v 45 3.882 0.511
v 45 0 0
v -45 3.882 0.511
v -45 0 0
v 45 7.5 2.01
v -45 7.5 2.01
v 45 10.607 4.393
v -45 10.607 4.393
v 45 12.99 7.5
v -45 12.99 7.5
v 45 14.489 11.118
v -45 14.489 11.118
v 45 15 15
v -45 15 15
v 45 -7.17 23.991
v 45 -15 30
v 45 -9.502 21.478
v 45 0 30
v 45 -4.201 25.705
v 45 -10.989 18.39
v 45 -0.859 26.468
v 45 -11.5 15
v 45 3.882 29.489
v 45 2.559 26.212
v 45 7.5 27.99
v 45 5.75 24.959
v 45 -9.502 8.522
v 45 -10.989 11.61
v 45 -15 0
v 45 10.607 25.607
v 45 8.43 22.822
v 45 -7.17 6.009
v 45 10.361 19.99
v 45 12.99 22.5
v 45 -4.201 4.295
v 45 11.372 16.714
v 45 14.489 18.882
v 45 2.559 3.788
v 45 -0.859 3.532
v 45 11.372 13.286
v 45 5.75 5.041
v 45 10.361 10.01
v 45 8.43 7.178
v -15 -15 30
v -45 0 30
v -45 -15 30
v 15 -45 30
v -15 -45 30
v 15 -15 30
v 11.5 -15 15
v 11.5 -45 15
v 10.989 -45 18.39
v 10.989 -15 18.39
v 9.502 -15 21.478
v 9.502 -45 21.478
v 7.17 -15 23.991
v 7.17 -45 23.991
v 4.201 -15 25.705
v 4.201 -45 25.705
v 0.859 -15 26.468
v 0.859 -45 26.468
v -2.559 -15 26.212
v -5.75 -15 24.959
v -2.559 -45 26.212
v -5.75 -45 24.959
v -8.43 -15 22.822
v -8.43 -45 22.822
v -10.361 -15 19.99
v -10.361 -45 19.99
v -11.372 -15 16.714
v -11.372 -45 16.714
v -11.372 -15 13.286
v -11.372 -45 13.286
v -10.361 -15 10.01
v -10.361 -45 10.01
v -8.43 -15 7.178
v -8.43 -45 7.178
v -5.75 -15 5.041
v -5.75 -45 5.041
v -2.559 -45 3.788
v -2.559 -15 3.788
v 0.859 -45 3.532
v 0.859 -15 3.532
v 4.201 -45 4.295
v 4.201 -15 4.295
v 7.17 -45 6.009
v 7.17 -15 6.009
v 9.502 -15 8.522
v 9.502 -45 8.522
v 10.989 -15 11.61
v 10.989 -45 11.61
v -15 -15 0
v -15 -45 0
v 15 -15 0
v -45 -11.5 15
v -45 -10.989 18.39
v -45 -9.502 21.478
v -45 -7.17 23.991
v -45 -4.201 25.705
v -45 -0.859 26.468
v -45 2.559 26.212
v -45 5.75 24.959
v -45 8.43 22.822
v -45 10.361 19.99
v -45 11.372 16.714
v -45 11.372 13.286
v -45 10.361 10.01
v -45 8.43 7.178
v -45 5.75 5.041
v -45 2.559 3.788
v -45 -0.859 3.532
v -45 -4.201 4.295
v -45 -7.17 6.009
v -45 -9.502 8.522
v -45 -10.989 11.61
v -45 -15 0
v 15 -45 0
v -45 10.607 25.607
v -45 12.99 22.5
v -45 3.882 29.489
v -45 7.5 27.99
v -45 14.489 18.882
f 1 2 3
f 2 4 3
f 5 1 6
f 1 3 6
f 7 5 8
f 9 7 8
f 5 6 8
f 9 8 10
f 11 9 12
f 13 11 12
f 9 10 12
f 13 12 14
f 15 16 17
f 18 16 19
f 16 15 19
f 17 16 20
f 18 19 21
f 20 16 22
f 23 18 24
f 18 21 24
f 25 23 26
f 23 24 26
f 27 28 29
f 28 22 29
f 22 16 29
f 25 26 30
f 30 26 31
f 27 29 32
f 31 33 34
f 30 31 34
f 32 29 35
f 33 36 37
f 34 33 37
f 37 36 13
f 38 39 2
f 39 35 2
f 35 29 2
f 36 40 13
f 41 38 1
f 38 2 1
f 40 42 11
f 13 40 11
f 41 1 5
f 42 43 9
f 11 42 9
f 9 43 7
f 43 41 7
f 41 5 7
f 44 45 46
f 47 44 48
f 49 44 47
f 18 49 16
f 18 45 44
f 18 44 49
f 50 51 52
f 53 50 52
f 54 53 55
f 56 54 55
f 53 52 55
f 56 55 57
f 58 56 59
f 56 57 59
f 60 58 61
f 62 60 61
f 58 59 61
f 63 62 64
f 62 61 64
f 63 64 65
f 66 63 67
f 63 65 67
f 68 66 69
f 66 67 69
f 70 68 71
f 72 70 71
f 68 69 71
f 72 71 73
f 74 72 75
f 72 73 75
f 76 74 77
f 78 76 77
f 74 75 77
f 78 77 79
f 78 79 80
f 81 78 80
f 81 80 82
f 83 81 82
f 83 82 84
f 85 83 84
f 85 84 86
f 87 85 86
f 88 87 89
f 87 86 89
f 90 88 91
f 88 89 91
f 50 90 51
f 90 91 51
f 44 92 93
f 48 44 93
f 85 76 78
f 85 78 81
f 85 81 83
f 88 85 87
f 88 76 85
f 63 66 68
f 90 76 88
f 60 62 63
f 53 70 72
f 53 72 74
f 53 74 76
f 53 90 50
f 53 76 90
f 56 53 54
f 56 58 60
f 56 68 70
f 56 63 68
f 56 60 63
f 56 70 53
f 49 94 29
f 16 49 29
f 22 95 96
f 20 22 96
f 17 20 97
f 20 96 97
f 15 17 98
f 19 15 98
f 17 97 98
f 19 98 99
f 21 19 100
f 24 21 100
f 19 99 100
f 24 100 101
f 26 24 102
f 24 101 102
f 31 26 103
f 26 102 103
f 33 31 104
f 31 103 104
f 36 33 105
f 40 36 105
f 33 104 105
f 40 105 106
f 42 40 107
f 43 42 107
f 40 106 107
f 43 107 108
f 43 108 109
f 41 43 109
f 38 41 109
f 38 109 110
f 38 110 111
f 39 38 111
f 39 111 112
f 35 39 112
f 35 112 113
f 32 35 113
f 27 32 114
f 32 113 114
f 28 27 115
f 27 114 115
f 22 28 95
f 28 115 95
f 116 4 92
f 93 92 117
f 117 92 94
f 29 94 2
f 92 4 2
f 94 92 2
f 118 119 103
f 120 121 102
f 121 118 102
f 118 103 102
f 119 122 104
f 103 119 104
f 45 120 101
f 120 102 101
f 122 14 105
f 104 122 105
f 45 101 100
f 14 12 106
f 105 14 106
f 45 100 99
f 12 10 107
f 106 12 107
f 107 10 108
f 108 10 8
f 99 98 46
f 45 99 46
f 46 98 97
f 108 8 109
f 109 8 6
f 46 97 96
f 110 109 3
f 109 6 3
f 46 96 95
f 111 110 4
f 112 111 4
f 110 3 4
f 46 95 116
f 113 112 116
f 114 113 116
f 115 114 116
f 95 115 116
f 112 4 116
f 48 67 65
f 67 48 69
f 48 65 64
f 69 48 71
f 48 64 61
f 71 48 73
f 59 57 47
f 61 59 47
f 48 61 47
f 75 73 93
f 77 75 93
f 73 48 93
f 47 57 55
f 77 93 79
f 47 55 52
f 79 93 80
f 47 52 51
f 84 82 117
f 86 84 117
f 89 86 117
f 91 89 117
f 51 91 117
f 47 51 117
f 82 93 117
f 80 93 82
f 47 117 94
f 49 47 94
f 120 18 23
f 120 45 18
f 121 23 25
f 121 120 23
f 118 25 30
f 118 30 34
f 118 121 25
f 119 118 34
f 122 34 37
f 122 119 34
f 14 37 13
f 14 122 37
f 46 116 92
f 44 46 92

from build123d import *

# Parameters (mm, degrees)
F1_DEPTH = 30
F3_R     = 11.5
F4_DEPTH = 30
F2_R     = 11.5
F5_DEPTH = 90
F6_R     = 14.99999


# Not quite as in the source:
# - a fillet or chamfer is up to 0.001 mm smaller than in the source, because OpenCascade refuses the exact size


with BuildPart() as f1:
    # F0 (on Top) → F1 (new body)
    with BuildSketch(Plane.XY):
        Polygon((15, -15), (45, -15), (45, 15), (-45, 15), (-45, -15), (-15, -15), align=None)
        Polygon((15, -45), (15, -15), (-15, -15), (-15, -45), (0, -45), align=None)
    extrude(amount=F1_DEPTH)

    # F3 (on face) → F4 (cut)
    with BuildSketch(Plane.XZ.offset(45)):
        with Locations((0, 15)):
            Circle(F3_R)
    extrude(amount=-F4_DEPTH, mode=Mode.SUBTRACT)

    # F2 (on face) → F5 (cut)
    with BuildSketch(Plane(origin=(-45, 0, 0), x_dir=(0, -1, 0), z_dir=(-1, 0, 0))):
        with Locations((0, 15)):
            Circle(F2_R)
    extrude(amount=-F5_DEPTH, mode=Mode.SUBTRACT)

    # F6 (radius 15 in the source; OpenCascade refuses exactly that, so slightly less here)
    f6_edges = [f1.edges().sort_by_distance(p)[0] for p in [
        (0, 15, 0),
        (0, 15, 30),
    ]]
    fillet(f6_edges, radius=F6_R)


solid = f1.part
